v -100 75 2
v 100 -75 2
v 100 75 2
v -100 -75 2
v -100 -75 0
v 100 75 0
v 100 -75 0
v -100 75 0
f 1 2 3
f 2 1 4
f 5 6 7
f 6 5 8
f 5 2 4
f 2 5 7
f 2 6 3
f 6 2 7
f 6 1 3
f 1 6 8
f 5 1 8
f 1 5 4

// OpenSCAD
    // MEDUSA CAPTURE: scan_1769396619.png
    
    // -- Settings --
    Sign_Height = 5;       // Total thickness (mm)
    Base_Height = 2;       // Solid base thickness (mm)
    Invert = true;         // True = Dark is raised, False = Light is raised
    Smoothness = 1;        // Resolution (1 = Pixel perfect)

    // -- Geometry --
    union() {
        // The Base Plate
        translate([0,0, Base_Height/2])
            cube([200, 150, Base_Height], center=true);

        // The Data Extrusion
        translate([0, 0, Base_Height])
            scale([200/640, 150/480, Sign_Height/255]) // Scale pixels to MM
            surface(file = "scan_1769396619.png", center = true, invert = Invert);
    }
    
